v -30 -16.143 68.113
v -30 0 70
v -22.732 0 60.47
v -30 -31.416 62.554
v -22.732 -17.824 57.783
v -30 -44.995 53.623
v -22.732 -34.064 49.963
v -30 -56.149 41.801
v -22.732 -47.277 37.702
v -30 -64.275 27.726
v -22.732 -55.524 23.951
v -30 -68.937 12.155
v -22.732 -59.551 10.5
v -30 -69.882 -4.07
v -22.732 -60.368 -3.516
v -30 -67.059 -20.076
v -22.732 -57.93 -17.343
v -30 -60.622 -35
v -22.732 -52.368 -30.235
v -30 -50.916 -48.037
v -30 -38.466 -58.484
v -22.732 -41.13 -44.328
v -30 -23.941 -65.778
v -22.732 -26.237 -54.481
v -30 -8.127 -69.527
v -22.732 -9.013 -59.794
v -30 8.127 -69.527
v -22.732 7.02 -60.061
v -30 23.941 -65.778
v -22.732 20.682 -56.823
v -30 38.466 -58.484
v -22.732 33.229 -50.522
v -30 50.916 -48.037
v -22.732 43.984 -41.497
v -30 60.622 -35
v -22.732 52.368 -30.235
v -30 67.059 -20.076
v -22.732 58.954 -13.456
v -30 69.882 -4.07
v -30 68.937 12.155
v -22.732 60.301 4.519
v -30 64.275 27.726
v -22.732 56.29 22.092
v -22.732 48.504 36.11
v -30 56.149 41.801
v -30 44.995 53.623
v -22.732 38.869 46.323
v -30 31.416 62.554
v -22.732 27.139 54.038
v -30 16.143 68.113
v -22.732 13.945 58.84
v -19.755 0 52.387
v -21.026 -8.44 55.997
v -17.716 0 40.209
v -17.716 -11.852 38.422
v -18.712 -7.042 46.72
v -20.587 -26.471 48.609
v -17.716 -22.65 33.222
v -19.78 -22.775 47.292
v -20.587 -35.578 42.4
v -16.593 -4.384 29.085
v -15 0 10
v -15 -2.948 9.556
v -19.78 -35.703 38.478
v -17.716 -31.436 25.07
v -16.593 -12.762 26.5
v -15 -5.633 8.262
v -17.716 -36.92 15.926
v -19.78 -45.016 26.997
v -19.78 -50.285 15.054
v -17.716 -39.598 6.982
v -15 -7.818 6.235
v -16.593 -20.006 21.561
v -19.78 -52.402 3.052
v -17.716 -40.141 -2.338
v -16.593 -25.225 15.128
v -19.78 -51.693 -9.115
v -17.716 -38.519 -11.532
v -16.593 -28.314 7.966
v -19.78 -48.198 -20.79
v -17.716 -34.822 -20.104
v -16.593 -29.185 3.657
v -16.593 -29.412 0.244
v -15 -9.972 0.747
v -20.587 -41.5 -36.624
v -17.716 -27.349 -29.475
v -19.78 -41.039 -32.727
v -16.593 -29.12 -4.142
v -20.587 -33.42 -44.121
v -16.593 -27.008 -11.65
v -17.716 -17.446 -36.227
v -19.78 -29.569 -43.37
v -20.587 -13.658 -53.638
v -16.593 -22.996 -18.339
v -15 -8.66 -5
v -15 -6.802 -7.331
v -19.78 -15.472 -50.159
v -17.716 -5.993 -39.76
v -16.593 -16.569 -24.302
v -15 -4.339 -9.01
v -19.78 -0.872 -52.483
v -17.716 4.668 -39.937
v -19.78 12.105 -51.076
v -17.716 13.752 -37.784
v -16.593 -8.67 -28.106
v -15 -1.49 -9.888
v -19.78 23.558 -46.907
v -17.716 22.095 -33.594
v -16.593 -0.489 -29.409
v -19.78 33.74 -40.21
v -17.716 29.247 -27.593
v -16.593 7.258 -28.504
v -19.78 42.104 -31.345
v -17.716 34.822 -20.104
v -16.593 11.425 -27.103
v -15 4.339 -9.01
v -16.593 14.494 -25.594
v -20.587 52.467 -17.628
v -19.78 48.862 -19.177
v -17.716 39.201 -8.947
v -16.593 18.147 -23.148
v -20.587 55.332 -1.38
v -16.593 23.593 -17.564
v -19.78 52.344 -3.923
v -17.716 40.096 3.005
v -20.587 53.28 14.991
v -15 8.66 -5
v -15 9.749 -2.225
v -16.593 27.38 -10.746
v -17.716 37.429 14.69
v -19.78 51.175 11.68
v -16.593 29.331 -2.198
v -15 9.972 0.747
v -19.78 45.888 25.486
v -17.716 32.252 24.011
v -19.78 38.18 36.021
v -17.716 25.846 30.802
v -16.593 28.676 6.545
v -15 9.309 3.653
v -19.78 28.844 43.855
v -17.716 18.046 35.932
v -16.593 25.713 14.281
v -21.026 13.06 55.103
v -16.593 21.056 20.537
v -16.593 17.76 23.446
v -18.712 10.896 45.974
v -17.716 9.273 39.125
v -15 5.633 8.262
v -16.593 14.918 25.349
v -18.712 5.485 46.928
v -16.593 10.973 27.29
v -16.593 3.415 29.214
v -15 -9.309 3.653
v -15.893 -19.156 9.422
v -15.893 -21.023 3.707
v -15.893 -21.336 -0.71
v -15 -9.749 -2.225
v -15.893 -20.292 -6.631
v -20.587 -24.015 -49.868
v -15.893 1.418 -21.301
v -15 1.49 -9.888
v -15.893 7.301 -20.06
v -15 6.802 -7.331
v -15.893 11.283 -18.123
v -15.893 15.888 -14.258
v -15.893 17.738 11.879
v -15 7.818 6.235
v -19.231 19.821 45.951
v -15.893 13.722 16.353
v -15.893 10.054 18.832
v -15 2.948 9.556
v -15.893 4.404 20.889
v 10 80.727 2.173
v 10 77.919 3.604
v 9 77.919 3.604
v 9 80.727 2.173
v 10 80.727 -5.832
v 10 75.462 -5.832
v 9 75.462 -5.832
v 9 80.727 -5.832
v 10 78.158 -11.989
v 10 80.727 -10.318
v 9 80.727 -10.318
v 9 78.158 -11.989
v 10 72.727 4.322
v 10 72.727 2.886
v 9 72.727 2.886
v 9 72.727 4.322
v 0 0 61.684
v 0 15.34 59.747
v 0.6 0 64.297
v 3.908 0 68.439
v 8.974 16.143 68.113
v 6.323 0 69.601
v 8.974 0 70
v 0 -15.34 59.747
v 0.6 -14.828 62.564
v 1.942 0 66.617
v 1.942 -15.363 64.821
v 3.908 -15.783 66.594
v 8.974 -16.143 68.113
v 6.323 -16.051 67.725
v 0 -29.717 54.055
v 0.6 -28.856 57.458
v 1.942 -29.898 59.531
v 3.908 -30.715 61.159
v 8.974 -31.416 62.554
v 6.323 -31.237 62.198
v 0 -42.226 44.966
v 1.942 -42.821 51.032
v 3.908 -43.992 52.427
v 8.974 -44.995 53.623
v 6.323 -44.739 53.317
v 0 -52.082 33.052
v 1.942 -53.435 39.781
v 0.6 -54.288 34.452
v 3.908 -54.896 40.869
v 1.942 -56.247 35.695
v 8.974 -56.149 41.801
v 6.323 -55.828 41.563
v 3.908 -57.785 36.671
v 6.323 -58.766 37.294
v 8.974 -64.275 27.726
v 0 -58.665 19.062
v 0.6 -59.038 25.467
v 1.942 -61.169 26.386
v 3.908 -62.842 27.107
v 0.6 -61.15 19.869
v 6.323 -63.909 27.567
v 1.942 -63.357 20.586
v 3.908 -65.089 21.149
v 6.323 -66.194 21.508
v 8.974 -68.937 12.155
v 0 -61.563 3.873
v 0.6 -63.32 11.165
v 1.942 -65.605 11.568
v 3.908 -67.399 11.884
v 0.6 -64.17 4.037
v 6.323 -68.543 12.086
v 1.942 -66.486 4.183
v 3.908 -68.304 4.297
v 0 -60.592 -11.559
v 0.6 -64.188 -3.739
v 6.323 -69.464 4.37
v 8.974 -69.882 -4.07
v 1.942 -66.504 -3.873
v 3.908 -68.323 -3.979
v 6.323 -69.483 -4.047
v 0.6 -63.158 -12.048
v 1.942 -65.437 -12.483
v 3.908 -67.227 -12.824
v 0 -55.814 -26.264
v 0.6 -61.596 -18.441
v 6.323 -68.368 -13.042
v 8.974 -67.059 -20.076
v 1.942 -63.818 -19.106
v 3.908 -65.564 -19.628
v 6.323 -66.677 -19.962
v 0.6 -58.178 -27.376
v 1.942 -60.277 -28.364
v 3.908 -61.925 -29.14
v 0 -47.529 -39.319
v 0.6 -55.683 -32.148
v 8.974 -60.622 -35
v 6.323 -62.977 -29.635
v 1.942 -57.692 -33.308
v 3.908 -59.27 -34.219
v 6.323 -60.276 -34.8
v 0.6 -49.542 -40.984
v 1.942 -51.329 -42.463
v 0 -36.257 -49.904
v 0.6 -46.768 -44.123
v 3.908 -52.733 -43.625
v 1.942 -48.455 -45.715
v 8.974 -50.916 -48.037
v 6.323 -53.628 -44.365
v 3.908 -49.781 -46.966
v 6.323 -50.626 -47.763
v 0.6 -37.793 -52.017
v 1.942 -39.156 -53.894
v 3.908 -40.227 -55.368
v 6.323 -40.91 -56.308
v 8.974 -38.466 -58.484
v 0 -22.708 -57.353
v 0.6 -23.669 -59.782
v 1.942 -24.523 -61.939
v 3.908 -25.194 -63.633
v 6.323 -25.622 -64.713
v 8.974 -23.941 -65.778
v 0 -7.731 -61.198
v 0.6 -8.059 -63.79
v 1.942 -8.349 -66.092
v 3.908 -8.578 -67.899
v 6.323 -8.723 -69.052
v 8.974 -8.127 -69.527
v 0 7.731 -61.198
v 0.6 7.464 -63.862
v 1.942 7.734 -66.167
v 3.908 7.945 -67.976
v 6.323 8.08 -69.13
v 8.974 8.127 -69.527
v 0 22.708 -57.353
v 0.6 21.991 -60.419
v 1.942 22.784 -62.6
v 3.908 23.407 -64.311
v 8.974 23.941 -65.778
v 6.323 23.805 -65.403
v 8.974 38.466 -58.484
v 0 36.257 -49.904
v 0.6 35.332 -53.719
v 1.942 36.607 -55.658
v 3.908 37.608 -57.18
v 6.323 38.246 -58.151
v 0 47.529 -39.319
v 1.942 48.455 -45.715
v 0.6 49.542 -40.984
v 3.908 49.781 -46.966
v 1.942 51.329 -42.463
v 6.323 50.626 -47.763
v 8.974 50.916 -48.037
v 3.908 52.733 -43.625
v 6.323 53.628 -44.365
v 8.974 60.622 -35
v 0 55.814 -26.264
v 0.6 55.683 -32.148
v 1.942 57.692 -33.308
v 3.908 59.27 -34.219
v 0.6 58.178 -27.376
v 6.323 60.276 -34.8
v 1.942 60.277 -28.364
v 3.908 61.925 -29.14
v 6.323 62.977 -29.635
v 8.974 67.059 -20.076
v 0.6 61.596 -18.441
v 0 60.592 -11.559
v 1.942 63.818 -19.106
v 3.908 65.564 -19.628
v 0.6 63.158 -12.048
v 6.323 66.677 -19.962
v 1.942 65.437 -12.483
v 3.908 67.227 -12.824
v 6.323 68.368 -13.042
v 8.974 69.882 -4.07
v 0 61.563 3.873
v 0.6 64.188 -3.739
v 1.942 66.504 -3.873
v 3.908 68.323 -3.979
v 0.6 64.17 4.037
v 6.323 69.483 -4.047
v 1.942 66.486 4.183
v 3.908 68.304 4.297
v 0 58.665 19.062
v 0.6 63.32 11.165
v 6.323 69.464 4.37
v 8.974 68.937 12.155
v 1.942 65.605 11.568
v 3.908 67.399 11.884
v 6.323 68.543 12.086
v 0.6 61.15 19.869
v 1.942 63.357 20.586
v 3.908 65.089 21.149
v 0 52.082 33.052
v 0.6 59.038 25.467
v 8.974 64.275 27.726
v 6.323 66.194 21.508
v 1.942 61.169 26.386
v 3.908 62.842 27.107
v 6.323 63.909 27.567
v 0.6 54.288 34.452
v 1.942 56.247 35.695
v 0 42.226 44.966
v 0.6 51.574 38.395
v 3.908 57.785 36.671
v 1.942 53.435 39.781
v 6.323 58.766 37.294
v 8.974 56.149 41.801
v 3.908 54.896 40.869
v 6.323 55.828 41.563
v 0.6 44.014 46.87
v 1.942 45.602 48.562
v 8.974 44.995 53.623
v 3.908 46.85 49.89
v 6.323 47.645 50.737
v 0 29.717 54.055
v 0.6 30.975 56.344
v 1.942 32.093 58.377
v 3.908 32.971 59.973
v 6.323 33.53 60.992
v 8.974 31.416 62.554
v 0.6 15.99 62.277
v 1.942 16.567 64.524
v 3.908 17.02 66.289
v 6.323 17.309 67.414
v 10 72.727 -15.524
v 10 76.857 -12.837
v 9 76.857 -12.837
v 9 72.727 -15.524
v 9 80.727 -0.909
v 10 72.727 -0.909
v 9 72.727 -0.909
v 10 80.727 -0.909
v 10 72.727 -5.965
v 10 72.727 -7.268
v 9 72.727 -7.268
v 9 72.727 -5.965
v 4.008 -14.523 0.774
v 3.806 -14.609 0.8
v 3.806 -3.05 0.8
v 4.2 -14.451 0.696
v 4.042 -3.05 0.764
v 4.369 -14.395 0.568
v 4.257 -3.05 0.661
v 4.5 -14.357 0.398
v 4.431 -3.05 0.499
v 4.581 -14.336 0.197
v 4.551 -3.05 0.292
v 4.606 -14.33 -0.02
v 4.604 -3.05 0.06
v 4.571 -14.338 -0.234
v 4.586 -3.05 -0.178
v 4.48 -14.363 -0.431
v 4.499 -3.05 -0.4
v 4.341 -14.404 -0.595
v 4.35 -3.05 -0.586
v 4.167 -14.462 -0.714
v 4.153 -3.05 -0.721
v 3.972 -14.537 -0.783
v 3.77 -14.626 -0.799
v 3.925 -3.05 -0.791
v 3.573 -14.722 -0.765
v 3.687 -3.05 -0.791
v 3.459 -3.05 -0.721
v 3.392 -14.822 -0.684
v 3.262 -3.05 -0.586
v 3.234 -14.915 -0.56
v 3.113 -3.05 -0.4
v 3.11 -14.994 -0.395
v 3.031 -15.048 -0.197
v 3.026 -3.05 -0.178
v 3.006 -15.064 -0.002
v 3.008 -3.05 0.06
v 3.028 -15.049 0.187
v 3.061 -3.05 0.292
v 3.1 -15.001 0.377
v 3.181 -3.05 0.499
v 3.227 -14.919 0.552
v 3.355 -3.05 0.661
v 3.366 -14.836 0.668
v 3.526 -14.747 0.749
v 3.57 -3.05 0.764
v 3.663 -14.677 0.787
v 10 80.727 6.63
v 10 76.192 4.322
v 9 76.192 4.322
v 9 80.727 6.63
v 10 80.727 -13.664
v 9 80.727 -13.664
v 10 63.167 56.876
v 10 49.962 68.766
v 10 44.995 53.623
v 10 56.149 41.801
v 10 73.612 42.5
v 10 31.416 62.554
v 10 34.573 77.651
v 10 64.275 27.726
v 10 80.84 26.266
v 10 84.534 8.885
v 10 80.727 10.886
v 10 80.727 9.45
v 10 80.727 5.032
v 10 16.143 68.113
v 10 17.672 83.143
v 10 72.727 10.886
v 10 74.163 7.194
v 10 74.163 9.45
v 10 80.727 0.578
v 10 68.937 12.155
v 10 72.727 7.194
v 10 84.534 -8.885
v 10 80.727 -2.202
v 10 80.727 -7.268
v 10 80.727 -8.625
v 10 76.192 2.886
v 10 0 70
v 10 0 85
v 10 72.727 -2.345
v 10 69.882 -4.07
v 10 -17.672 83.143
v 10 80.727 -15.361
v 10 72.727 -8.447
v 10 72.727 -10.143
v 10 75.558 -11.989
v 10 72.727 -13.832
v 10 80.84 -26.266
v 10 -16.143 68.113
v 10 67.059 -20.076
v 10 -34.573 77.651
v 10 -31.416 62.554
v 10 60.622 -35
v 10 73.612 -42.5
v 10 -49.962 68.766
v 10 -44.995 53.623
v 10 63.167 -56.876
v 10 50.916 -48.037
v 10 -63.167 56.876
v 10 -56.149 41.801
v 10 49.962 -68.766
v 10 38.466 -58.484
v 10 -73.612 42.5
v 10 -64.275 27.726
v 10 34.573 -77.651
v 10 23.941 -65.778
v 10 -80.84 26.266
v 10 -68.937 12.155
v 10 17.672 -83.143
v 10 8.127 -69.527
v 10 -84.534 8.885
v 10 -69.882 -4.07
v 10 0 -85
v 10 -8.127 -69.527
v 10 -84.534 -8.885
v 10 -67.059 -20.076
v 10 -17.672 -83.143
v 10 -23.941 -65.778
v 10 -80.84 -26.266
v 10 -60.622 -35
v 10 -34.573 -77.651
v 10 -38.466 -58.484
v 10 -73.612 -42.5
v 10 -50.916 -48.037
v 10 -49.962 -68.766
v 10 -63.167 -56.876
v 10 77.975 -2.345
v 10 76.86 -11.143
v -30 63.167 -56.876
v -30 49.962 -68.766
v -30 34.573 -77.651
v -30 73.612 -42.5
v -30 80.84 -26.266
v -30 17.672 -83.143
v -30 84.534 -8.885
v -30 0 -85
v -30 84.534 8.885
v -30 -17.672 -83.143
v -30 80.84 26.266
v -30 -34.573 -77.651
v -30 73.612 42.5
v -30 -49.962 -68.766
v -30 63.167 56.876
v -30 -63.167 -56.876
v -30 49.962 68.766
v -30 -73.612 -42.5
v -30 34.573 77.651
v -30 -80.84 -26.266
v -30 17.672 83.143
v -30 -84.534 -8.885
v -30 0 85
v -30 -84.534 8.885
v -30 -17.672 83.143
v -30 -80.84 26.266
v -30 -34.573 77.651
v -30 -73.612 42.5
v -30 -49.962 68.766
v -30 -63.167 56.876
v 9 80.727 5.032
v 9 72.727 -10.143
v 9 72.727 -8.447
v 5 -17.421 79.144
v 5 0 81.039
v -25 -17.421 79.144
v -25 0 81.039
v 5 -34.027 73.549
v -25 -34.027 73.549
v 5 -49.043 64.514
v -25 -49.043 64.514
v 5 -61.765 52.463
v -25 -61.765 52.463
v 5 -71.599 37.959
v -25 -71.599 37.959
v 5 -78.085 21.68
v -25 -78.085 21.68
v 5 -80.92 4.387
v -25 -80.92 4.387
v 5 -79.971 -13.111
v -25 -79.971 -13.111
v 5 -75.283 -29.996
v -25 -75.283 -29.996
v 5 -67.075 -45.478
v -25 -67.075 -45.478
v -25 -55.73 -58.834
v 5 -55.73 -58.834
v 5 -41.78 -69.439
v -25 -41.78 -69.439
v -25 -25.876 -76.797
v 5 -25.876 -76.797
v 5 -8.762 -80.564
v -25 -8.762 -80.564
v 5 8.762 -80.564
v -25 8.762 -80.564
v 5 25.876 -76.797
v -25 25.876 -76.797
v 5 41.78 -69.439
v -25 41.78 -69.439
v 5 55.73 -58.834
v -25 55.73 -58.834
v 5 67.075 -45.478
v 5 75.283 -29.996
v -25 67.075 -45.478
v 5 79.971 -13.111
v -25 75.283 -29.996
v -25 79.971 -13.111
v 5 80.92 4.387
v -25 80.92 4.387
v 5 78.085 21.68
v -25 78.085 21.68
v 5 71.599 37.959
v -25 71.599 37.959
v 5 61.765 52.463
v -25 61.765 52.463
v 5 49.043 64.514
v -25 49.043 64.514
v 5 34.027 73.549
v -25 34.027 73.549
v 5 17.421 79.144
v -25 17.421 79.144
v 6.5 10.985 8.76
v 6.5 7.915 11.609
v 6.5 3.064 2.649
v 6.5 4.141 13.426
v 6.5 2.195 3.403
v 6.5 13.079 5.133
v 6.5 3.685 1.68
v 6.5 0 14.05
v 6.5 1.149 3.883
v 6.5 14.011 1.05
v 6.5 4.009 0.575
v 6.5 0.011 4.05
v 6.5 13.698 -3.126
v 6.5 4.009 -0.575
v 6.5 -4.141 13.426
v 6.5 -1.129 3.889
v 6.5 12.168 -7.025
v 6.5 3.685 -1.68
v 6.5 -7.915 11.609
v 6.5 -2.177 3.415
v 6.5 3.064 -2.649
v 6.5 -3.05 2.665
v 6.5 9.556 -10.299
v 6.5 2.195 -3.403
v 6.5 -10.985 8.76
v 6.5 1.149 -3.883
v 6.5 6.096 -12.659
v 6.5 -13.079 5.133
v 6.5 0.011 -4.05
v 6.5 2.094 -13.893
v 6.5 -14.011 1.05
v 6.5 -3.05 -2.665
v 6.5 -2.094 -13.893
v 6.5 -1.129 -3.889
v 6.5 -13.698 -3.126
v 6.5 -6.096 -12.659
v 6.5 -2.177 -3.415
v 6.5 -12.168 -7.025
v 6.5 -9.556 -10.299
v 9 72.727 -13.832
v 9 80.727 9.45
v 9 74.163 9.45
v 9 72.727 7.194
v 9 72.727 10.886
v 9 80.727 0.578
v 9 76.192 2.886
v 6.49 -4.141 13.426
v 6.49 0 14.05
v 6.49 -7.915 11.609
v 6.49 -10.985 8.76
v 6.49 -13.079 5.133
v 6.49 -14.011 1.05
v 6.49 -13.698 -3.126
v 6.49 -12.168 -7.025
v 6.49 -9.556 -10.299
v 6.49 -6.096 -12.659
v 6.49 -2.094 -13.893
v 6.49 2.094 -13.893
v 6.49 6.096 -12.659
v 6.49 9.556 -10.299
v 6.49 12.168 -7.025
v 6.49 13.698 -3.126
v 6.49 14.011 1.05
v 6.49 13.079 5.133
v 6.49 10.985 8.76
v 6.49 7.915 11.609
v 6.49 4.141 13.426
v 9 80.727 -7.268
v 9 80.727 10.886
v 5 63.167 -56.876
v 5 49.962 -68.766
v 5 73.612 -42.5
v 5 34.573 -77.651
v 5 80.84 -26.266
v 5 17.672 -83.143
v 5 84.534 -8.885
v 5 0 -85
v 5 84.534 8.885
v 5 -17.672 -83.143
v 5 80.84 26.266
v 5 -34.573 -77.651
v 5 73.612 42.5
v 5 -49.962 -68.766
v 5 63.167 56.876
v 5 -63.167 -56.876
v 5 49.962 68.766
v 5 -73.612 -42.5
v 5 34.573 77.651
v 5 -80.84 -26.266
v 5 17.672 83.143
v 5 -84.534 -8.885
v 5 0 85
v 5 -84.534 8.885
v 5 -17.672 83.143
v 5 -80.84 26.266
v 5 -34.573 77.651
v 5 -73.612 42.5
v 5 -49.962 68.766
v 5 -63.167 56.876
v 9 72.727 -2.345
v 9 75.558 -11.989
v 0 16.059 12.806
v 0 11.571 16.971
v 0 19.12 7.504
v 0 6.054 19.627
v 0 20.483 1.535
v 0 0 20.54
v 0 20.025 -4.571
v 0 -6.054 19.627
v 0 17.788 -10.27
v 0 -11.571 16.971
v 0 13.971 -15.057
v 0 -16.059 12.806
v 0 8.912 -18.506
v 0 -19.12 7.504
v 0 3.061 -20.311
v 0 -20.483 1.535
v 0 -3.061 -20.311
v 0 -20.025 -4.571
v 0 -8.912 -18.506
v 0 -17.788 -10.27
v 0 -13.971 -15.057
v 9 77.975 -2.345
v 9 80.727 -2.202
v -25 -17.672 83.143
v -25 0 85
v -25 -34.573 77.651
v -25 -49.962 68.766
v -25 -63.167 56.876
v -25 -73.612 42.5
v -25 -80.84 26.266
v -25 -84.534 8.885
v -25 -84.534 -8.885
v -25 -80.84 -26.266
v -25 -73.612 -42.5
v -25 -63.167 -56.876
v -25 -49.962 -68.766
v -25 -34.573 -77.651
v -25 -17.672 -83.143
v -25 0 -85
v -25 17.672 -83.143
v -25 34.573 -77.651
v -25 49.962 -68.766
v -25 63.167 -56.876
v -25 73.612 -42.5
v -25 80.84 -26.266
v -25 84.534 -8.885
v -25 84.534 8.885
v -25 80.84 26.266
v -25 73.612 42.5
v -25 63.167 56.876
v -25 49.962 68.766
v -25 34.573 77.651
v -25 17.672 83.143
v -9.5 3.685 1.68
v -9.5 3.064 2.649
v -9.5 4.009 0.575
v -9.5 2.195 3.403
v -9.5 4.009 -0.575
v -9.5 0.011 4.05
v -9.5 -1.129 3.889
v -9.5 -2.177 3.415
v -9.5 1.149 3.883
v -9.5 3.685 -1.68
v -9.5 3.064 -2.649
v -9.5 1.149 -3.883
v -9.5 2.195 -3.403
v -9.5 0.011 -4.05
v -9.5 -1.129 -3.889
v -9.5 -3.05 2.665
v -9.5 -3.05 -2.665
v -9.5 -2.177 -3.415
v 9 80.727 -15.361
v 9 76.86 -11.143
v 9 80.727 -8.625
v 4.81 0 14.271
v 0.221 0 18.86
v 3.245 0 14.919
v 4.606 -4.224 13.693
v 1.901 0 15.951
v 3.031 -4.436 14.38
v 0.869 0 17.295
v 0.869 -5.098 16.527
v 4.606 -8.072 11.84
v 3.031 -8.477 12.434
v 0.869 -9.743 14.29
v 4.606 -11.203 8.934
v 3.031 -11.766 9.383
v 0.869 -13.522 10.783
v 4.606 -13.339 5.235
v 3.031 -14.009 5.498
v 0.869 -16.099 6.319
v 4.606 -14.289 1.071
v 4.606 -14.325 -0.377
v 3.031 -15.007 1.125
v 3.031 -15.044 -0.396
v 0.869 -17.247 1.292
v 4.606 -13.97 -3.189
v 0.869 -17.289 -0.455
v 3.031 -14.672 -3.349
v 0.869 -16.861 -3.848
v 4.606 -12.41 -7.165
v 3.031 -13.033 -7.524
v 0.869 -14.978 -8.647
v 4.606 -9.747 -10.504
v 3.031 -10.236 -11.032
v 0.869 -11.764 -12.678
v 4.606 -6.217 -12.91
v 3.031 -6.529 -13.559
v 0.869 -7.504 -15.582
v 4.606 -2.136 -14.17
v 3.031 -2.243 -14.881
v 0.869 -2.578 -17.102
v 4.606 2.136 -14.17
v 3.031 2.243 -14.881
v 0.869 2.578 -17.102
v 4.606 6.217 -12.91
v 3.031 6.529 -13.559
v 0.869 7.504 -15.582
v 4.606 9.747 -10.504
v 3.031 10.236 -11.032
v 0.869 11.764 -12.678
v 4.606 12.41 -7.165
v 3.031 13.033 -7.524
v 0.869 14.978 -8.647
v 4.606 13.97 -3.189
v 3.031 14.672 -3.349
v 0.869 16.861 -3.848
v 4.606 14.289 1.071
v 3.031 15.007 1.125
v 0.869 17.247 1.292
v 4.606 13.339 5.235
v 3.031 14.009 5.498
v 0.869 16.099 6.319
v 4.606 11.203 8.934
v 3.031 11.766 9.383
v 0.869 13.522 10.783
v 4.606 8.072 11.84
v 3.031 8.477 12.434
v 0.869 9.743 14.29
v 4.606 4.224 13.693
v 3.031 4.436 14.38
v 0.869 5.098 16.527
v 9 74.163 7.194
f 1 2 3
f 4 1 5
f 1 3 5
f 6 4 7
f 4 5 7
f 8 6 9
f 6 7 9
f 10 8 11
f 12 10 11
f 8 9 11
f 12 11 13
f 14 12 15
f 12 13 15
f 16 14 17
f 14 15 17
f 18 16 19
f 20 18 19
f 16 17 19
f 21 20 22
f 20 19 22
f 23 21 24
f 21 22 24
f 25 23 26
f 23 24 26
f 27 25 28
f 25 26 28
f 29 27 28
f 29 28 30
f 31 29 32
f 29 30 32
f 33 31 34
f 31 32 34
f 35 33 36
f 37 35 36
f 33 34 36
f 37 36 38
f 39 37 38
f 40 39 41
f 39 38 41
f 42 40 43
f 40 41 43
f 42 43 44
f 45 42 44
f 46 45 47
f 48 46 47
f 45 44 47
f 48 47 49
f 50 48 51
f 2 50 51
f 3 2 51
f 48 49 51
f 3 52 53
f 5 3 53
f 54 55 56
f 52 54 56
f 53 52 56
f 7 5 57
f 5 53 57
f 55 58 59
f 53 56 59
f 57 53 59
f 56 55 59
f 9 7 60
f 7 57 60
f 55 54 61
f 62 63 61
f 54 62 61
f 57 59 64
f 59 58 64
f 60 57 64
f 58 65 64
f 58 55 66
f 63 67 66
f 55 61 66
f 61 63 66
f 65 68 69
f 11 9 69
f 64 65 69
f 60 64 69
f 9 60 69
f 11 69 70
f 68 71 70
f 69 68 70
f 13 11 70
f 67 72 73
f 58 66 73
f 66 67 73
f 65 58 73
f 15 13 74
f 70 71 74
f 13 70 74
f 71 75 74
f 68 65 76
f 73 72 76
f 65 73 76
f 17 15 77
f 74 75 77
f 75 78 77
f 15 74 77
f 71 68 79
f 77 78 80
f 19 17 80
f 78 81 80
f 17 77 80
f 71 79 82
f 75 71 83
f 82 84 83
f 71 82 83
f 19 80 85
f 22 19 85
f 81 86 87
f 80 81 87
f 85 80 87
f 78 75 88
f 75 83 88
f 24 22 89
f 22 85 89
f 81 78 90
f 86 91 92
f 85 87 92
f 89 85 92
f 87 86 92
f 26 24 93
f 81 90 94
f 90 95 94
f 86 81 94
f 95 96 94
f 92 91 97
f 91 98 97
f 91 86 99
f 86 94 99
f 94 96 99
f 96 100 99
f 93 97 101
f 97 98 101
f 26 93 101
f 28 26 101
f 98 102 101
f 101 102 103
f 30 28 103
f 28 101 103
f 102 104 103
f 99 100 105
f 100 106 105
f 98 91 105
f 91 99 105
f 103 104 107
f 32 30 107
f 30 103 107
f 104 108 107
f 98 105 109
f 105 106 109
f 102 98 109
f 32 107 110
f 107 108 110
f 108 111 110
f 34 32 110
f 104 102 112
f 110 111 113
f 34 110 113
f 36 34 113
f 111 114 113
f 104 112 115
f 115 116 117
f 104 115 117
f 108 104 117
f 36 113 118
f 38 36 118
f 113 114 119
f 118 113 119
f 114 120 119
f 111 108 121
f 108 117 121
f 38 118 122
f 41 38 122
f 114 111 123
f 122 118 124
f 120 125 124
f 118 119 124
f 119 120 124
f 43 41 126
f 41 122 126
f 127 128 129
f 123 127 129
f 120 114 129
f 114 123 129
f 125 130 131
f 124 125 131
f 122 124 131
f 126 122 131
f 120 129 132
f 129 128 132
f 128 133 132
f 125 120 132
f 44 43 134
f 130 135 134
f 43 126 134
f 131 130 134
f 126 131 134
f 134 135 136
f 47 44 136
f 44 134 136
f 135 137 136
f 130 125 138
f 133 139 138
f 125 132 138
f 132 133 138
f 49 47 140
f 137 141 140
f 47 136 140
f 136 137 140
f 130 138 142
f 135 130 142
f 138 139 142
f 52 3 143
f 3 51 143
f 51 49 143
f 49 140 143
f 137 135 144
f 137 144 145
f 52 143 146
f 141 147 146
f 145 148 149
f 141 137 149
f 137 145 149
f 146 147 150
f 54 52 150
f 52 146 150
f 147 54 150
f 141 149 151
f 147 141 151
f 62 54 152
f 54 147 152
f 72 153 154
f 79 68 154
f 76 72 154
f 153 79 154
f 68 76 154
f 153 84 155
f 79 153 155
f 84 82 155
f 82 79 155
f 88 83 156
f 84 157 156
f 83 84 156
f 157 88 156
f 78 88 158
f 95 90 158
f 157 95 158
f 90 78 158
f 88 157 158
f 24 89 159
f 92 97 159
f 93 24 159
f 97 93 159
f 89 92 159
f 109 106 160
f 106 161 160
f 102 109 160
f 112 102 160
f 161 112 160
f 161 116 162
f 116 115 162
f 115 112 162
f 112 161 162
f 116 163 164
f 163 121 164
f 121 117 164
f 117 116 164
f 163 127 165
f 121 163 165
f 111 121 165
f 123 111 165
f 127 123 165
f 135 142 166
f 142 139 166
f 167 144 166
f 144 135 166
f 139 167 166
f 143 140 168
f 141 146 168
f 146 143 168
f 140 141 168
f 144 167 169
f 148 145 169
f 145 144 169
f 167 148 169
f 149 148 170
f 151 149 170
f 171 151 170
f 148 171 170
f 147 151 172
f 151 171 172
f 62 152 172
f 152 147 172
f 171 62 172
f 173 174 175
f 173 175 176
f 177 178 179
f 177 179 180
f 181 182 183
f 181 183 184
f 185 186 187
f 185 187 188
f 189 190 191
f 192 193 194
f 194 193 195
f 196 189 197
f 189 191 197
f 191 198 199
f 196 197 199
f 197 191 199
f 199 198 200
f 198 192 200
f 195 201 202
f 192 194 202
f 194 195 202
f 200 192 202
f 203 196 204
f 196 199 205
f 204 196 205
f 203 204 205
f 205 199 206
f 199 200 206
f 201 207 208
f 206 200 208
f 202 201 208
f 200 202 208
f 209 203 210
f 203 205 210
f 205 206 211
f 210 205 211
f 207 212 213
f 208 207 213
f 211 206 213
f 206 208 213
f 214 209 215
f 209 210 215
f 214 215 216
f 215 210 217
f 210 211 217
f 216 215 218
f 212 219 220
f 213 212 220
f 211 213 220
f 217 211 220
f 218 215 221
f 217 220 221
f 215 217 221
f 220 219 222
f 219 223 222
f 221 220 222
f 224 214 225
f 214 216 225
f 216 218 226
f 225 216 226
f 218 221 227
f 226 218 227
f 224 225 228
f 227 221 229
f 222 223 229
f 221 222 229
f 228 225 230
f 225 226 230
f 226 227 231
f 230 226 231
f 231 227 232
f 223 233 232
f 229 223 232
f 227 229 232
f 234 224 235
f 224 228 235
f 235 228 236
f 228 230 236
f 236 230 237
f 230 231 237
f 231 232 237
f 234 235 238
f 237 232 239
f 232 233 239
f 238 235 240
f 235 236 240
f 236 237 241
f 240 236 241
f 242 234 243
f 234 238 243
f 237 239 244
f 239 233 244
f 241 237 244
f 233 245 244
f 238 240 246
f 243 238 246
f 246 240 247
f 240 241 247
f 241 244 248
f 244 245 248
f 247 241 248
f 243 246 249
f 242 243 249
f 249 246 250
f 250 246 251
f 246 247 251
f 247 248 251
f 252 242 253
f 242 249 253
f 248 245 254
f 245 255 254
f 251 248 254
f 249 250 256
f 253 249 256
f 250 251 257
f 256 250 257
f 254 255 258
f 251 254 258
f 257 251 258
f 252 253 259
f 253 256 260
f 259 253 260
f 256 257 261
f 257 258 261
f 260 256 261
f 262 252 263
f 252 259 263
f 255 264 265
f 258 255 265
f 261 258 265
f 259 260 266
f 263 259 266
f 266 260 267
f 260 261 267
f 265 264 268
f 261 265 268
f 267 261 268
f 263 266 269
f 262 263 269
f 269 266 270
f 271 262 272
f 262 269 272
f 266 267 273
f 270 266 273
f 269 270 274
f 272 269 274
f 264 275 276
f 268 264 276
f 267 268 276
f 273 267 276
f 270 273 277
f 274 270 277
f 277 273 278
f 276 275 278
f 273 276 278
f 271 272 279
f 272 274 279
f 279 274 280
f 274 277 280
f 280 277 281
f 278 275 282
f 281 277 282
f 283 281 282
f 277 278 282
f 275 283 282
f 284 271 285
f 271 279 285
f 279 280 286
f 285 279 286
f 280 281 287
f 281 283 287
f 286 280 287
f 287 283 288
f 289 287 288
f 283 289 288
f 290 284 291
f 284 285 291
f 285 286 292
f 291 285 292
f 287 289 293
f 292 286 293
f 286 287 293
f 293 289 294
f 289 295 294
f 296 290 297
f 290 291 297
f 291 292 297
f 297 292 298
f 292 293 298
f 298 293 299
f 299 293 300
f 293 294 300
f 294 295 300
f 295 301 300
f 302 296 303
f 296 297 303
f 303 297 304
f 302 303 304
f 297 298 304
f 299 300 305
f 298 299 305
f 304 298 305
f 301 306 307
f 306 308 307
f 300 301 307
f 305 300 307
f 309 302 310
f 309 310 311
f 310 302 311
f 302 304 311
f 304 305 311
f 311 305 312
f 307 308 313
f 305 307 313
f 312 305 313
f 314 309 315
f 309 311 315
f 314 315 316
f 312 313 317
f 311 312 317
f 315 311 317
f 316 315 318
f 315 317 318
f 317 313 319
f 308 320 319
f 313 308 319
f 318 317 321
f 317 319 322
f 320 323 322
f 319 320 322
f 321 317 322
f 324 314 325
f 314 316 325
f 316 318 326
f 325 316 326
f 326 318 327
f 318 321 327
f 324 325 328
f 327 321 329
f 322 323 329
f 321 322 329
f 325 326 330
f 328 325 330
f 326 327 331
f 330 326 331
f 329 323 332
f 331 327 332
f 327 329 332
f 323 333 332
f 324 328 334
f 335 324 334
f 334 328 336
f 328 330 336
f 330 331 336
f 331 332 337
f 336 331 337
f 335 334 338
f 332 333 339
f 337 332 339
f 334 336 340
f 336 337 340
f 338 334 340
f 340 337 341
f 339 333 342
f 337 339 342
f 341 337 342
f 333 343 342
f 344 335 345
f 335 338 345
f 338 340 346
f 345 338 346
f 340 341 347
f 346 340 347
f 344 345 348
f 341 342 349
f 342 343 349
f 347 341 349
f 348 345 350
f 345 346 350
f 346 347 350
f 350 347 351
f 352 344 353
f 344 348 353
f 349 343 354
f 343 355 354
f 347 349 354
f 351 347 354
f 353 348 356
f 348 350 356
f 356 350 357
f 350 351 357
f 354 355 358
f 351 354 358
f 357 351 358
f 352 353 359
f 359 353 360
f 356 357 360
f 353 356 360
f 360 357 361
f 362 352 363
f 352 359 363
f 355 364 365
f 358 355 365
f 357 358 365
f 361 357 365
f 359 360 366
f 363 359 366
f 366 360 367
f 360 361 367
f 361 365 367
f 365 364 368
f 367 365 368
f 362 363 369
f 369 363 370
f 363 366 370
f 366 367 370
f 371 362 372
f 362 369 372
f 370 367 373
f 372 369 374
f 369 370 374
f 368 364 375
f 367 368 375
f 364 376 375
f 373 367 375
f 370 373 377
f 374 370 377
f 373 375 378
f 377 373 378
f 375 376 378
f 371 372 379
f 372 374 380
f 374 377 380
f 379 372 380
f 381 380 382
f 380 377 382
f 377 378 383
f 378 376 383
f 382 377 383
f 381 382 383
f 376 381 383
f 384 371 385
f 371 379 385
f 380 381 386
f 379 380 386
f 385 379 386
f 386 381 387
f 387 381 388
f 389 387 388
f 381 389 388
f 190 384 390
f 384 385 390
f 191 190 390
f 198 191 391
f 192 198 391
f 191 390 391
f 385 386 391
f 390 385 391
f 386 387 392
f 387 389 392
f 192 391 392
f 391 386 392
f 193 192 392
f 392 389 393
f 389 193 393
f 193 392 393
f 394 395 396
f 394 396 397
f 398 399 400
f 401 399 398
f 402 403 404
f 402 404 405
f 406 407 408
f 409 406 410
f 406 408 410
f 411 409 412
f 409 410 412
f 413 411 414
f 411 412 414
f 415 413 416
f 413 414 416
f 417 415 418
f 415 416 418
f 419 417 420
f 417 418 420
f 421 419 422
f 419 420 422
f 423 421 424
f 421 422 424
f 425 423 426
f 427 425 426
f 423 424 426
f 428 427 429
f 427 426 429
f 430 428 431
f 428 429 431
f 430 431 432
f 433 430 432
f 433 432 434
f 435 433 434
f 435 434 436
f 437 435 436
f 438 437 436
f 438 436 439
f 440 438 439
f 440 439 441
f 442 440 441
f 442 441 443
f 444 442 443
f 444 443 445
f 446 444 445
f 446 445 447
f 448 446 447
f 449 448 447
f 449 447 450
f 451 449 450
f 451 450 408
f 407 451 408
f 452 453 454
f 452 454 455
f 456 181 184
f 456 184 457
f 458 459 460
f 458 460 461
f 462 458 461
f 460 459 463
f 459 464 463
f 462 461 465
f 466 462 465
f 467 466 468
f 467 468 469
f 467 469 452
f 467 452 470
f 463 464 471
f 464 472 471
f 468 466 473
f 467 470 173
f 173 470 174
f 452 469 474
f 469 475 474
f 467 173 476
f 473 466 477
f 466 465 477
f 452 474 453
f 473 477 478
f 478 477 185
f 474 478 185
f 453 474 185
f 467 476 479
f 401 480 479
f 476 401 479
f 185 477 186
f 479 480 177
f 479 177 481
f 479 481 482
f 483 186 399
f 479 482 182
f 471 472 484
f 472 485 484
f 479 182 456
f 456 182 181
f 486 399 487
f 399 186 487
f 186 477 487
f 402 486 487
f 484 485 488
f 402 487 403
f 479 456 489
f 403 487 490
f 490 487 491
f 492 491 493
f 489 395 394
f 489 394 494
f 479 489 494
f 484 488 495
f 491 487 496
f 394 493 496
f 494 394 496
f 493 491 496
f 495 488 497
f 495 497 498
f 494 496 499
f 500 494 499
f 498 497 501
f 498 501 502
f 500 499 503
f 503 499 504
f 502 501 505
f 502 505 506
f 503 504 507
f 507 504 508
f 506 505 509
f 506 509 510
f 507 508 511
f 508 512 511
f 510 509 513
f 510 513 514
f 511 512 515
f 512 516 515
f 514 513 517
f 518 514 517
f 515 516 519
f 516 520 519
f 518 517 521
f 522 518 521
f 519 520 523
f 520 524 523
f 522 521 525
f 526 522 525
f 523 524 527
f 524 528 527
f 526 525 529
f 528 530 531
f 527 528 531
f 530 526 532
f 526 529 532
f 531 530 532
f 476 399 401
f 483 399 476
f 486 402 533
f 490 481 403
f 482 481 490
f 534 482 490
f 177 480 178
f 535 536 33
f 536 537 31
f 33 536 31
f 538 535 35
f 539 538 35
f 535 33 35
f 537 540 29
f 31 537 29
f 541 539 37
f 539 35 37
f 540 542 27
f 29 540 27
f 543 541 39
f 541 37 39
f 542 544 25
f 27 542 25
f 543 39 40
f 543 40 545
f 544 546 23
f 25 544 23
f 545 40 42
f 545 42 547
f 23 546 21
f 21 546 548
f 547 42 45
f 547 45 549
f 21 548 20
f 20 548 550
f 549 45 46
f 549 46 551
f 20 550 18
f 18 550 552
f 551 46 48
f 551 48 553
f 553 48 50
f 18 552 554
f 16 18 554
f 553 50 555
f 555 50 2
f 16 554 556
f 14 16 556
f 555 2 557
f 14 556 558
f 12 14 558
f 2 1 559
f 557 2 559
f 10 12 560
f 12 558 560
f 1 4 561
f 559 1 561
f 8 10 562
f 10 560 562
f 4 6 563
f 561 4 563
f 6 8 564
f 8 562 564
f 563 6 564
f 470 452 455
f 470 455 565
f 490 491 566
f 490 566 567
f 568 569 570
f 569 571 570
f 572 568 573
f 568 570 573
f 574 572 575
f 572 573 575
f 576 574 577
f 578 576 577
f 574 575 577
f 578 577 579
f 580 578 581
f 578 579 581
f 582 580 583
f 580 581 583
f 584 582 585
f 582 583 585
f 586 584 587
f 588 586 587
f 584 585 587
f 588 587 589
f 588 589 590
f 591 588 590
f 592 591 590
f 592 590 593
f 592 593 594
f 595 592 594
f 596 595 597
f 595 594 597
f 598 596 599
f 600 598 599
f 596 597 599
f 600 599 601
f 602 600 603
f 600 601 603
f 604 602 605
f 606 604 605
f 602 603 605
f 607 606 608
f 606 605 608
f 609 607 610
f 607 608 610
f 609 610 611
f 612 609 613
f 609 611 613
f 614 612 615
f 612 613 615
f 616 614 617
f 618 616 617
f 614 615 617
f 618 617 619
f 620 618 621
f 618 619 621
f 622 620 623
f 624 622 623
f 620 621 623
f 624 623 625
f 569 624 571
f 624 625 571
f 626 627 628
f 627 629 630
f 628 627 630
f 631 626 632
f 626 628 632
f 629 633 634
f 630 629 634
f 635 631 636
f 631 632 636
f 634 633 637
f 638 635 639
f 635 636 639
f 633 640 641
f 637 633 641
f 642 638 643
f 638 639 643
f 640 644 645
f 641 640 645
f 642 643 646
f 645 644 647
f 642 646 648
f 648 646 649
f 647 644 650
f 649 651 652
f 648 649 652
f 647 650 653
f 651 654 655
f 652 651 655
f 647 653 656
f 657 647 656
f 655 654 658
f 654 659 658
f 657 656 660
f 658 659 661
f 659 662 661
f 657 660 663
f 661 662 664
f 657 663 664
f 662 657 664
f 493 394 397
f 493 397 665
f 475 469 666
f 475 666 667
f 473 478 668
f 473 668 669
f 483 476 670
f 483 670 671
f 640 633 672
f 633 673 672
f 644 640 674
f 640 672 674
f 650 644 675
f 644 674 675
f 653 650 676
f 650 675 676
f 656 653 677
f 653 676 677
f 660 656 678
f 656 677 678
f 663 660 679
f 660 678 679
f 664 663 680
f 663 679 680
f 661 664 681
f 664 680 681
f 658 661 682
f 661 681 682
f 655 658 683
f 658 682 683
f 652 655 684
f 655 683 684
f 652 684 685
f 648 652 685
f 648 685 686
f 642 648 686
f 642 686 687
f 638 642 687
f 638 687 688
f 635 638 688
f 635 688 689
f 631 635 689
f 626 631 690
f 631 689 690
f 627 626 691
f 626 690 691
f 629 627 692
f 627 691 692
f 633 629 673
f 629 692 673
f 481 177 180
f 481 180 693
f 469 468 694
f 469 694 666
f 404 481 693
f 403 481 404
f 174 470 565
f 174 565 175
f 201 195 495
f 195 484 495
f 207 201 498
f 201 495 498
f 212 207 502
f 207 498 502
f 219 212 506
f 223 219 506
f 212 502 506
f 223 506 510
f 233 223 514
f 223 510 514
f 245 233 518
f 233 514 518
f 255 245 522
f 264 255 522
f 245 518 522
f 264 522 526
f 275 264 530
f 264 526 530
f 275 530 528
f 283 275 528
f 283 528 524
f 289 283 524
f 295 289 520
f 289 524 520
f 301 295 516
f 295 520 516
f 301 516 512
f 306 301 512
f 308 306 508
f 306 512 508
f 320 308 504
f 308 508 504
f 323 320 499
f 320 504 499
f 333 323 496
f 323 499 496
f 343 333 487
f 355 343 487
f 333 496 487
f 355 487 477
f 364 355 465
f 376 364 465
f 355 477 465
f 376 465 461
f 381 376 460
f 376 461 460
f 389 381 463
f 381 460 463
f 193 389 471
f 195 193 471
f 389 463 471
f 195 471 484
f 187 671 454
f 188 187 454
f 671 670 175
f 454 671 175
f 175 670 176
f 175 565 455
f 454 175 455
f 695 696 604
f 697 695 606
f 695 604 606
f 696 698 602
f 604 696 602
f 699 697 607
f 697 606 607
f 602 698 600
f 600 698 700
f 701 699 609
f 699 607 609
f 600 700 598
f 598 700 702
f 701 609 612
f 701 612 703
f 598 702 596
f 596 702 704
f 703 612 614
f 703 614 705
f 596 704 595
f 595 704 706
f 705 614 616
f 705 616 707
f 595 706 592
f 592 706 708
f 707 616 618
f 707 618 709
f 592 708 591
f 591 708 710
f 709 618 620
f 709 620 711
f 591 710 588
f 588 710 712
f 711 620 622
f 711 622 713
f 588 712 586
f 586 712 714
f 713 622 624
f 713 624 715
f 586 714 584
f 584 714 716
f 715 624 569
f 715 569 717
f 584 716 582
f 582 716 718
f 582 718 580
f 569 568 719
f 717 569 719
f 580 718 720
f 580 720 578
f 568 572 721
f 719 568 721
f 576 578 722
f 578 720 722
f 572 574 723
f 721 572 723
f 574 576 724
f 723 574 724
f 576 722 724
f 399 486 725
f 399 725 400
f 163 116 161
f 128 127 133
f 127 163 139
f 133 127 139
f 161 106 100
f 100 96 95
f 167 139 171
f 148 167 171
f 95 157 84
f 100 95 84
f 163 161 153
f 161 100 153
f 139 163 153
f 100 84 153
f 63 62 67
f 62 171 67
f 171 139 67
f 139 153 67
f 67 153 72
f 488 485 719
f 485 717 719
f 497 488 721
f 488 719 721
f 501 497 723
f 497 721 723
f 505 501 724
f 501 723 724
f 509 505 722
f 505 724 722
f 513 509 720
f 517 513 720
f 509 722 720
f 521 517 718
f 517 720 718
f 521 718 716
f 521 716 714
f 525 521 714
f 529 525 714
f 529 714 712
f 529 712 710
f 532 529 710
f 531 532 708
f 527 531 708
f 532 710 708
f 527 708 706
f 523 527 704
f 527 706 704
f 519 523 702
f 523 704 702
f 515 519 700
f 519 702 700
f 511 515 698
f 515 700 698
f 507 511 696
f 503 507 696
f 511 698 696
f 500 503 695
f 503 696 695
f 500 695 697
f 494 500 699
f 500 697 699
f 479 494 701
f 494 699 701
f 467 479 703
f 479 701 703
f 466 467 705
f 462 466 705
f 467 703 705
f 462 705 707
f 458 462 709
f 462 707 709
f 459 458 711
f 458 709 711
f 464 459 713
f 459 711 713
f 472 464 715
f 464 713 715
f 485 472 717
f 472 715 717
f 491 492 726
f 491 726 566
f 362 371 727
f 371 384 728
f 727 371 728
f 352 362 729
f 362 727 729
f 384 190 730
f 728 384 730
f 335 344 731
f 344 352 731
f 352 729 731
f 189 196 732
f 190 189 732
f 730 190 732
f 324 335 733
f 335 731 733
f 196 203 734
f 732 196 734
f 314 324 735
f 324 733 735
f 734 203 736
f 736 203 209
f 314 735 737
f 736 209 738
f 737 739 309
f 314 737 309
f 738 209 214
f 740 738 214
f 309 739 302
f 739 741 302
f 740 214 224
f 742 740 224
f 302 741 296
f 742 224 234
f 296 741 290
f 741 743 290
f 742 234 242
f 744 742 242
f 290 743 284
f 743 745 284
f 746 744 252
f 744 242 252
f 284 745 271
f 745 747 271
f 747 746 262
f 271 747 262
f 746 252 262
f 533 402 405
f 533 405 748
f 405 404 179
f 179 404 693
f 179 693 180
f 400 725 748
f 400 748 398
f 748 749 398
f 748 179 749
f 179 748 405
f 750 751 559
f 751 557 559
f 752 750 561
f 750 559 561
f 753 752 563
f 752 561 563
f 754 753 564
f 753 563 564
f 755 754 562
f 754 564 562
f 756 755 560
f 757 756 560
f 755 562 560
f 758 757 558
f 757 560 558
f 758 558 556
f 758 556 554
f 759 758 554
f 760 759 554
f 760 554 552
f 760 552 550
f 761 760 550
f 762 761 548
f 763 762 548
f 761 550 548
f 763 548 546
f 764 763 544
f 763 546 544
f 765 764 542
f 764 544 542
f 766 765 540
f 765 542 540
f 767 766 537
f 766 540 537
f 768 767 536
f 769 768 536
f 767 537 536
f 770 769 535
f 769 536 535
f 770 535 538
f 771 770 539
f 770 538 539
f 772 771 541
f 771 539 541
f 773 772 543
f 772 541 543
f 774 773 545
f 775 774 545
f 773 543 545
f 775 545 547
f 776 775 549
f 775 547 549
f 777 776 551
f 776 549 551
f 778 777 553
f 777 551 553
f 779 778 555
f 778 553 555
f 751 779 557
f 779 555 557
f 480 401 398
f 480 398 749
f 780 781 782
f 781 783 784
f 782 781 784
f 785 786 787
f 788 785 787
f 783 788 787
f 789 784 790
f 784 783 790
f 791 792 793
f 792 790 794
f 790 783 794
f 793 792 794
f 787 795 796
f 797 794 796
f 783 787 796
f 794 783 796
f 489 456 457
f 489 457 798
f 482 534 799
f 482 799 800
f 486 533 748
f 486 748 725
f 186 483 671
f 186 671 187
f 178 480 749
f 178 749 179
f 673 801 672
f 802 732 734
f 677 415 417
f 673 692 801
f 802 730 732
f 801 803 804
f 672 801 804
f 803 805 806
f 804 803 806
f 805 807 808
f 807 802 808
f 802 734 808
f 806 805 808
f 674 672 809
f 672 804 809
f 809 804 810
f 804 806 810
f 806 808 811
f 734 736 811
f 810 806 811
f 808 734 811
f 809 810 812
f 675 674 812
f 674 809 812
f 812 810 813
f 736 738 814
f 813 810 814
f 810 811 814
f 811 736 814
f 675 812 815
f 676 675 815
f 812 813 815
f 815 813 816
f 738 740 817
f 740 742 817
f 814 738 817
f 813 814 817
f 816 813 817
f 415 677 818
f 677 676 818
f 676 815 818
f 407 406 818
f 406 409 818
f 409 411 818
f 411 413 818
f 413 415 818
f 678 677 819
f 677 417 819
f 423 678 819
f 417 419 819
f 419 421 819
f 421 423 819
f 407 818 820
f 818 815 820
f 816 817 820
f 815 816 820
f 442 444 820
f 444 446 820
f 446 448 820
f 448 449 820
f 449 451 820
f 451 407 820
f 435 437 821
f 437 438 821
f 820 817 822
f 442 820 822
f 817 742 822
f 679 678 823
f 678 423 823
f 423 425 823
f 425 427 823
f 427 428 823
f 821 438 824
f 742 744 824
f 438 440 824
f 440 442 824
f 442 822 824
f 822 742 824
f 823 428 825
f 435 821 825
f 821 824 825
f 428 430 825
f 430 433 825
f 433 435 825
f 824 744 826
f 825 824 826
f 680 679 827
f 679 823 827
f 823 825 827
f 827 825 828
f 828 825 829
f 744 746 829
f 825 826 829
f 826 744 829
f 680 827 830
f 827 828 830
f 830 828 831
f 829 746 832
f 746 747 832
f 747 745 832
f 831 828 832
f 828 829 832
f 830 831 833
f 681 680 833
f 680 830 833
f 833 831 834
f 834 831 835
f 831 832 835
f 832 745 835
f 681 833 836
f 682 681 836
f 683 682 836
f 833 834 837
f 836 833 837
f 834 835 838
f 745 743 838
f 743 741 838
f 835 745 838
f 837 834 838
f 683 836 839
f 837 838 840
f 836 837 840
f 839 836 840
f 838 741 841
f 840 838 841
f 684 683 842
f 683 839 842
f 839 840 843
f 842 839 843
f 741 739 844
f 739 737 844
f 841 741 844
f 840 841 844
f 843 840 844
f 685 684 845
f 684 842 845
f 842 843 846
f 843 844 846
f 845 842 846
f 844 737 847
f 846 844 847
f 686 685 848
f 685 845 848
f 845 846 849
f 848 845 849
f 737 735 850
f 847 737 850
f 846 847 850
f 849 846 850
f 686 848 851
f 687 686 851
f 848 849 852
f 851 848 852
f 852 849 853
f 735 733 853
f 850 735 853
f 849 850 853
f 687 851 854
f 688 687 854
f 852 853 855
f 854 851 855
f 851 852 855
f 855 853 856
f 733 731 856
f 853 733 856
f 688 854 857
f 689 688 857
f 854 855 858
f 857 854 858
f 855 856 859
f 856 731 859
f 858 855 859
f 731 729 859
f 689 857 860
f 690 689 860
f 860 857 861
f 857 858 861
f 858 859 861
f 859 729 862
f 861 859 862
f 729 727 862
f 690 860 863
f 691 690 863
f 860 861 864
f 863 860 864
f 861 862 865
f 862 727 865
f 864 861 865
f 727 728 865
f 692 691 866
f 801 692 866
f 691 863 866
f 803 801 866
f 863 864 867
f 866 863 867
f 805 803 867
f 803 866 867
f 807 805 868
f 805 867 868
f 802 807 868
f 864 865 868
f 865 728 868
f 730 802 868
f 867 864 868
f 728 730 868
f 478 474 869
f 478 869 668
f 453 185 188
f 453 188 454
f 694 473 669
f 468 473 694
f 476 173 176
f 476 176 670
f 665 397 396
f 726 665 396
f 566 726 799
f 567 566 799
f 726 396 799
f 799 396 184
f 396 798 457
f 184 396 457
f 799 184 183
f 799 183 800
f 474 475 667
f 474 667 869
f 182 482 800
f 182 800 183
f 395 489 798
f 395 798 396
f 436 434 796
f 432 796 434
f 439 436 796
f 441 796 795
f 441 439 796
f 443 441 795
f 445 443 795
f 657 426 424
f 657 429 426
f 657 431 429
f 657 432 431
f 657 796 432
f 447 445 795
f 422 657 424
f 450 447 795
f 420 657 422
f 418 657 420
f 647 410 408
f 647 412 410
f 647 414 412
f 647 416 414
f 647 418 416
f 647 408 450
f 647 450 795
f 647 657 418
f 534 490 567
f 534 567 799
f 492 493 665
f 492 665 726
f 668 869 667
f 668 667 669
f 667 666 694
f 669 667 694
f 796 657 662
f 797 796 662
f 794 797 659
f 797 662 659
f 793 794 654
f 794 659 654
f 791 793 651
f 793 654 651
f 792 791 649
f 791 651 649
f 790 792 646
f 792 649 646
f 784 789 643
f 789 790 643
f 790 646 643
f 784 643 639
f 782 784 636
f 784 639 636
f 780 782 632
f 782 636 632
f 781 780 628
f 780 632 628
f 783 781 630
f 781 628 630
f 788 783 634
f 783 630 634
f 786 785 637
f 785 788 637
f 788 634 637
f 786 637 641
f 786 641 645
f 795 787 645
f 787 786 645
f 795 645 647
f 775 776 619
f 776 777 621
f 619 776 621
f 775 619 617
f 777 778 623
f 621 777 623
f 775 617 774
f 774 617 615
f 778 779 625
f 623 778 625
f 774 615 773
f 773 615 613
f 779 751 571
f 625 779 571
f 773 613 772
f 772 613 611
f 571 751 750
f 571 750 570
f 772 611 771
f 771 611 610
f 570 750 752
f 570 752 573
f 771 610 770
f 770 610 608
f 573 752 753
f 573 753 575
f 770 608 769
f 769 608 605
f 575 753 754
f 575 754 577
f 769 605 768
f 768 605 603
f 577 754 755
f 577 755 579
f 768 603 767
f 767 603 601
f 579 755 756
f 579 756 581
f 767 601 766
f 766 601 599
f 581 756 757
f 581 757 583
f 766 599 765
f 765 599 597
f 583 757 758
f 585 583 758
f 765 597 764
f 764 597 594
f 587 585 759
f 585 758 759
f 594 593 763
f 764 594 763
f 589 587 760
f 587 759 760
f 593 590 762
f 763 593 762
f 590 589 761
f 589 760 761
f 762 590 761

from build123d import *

# Parameters (mm, degrees)
BOSS_EXTRUDE2_DEPTH = 16
CUT_EXTRUDE2_DEPTH  = 1
SKETCH6_R           = 0.8
CUT_EXTRUDE4_DEPTH  = 20


with BuildPart() as part:
    # Sketch1 → Revolve2 (revolve)
    with BuildSketch(Plane.XY):
        with BuildLine():
            Line((8.97393545, 70), (10, 70))
            Line((10, 70), (10, 85))
            Line((10, 85), (5, 85))
            Line((5, 85), (5, 81.038856971))
            Line((5, 81.038856971), (-25, 81.038856971))
            Line((-25, 81.038856971), (-25, 85))
            Line((-25, 85), (-30, 85))
            Line((-30, 85), (-30, 70))
            add(Edge.make_bspline(
                [(-30, 70), (-18.635717154, 58.062094), (-15, 10)],
                knots=[0, 0, 0, 1, 1, 1], degree=2, weights=[1, 2.302666222, 1]))
            Line((-15, 10), (-15, 0))
            Line((-15, 0), (-9.5, 0))
            Line((-9.5, 0), (-9.5, 4.05))
            Line((-9.5, 4.05), (6.5, 4.05))
            Line((6.5, 4.05), (6.5, 14.05))
            Line((6.5, 14.05), (6.49, 14.05))
            ThreePointArc((6.49, 14.05), (1.90087699, 15.95087699), (0, 20.54))
            Line((0, 20.54), (0, 61.684457842))
            ThreePointArc((0, 61.684457842), (2.856751481, 67.601519544), (8.97393545, 70))
        make_face()
    revolve(axis=Axis((0, 0, 0), (1, 0, 0)))

    # Sketch2 → Boss-Extrude2 (add)
    with BuildSketch(Plane(origin=(6.5, 0, 0), x_dir=(0, 0, -1), z_dir=(1, 0, 0))):
        with BuildLine():
            Line((0, -3.05), (-2.664582519, -3.05))
            ThreePointArc((-2.664582519, -3.05), (0, -4.05), (2.664582519, -3.05))
            Line((2.664582519, -3.05), (0, -3.05))
        make_face()
    extrude(amount=-BOSS_EXTRUDE2_DEPTH)

    # Sketch5 → Cut-Extrude2 (cut)
    with BuildSketch(Plane(origin=(10, 0, 0), x_dir=(0, 0, -1), z_dir=(1, 0, 0))):
        Polygon((-10.885951739, 80.726758939), (-9.450054303, 80.726758939), (-9.450054303, 74.162656375), (-7.193644046, 74.162656375), (-7.193644046, 72.726758939), (-10.885951739, 72.726758939), align=None)
        Polygon((-6.629541482, 80.726758939), (-5.031785072, 80.726758939), (-3.603900457, 77.919066632), (-2.172810713, 80.726758939), (-0.578259431, 80.726758939), (-2.885951739, 76.191502529), (-2.885951739, 72.726758939), (-4.321849175, 72.726758939), (-4.321849175, 76.191502529), align=None)
        Polygon((0.908920056, 80.726758939), (2.202189287, 80.726758939), (5.831996979, 75.462335862), (5.831996979, 80.726758939), (7.267894415, 80.726758939), (7.267894415, 72.726758939), (5.9650098, 72.726758939), (2.344817492, 77.975156375), (2.344817492, 72.726758939), (0.908920056, 72.726758939), align=None)
        Polygon((8.62526621, 80.726758939), (10.317573902, 80.726758939), (11.989048261, 78.157848683), (13.663727748, 80.726758939), (15.360843133, 80.726758939), (12.836804672, 76.856566632), (15.524304672, 72.726758939), (13.831996979, 72.726758939), (11.989048261, 75.558489709), (10.142894415, 72.726758939), (8.447381595, 72.726758939), (11.142894415, 76.85977176), align=None)
    extrude(amount=-CUT_EXTRUDE2_DEPTH, mode=Mode.SUBTRACT)

    # Sketch6 → Cut-Extrude4 (cut)
    with BuildSketch(Plane(origin=(0, -3.05, 0), x_dir=(1, 0, 0), z_dir=(0, 1, 0))):
        with Locations((3.805975745, 0)):
            Circle(SKETCH6_R)
    extrude(amount=-CUT_EXTRUDE4_DEPTH, mode=Mode.SUBTRACT)


solid = part.part
